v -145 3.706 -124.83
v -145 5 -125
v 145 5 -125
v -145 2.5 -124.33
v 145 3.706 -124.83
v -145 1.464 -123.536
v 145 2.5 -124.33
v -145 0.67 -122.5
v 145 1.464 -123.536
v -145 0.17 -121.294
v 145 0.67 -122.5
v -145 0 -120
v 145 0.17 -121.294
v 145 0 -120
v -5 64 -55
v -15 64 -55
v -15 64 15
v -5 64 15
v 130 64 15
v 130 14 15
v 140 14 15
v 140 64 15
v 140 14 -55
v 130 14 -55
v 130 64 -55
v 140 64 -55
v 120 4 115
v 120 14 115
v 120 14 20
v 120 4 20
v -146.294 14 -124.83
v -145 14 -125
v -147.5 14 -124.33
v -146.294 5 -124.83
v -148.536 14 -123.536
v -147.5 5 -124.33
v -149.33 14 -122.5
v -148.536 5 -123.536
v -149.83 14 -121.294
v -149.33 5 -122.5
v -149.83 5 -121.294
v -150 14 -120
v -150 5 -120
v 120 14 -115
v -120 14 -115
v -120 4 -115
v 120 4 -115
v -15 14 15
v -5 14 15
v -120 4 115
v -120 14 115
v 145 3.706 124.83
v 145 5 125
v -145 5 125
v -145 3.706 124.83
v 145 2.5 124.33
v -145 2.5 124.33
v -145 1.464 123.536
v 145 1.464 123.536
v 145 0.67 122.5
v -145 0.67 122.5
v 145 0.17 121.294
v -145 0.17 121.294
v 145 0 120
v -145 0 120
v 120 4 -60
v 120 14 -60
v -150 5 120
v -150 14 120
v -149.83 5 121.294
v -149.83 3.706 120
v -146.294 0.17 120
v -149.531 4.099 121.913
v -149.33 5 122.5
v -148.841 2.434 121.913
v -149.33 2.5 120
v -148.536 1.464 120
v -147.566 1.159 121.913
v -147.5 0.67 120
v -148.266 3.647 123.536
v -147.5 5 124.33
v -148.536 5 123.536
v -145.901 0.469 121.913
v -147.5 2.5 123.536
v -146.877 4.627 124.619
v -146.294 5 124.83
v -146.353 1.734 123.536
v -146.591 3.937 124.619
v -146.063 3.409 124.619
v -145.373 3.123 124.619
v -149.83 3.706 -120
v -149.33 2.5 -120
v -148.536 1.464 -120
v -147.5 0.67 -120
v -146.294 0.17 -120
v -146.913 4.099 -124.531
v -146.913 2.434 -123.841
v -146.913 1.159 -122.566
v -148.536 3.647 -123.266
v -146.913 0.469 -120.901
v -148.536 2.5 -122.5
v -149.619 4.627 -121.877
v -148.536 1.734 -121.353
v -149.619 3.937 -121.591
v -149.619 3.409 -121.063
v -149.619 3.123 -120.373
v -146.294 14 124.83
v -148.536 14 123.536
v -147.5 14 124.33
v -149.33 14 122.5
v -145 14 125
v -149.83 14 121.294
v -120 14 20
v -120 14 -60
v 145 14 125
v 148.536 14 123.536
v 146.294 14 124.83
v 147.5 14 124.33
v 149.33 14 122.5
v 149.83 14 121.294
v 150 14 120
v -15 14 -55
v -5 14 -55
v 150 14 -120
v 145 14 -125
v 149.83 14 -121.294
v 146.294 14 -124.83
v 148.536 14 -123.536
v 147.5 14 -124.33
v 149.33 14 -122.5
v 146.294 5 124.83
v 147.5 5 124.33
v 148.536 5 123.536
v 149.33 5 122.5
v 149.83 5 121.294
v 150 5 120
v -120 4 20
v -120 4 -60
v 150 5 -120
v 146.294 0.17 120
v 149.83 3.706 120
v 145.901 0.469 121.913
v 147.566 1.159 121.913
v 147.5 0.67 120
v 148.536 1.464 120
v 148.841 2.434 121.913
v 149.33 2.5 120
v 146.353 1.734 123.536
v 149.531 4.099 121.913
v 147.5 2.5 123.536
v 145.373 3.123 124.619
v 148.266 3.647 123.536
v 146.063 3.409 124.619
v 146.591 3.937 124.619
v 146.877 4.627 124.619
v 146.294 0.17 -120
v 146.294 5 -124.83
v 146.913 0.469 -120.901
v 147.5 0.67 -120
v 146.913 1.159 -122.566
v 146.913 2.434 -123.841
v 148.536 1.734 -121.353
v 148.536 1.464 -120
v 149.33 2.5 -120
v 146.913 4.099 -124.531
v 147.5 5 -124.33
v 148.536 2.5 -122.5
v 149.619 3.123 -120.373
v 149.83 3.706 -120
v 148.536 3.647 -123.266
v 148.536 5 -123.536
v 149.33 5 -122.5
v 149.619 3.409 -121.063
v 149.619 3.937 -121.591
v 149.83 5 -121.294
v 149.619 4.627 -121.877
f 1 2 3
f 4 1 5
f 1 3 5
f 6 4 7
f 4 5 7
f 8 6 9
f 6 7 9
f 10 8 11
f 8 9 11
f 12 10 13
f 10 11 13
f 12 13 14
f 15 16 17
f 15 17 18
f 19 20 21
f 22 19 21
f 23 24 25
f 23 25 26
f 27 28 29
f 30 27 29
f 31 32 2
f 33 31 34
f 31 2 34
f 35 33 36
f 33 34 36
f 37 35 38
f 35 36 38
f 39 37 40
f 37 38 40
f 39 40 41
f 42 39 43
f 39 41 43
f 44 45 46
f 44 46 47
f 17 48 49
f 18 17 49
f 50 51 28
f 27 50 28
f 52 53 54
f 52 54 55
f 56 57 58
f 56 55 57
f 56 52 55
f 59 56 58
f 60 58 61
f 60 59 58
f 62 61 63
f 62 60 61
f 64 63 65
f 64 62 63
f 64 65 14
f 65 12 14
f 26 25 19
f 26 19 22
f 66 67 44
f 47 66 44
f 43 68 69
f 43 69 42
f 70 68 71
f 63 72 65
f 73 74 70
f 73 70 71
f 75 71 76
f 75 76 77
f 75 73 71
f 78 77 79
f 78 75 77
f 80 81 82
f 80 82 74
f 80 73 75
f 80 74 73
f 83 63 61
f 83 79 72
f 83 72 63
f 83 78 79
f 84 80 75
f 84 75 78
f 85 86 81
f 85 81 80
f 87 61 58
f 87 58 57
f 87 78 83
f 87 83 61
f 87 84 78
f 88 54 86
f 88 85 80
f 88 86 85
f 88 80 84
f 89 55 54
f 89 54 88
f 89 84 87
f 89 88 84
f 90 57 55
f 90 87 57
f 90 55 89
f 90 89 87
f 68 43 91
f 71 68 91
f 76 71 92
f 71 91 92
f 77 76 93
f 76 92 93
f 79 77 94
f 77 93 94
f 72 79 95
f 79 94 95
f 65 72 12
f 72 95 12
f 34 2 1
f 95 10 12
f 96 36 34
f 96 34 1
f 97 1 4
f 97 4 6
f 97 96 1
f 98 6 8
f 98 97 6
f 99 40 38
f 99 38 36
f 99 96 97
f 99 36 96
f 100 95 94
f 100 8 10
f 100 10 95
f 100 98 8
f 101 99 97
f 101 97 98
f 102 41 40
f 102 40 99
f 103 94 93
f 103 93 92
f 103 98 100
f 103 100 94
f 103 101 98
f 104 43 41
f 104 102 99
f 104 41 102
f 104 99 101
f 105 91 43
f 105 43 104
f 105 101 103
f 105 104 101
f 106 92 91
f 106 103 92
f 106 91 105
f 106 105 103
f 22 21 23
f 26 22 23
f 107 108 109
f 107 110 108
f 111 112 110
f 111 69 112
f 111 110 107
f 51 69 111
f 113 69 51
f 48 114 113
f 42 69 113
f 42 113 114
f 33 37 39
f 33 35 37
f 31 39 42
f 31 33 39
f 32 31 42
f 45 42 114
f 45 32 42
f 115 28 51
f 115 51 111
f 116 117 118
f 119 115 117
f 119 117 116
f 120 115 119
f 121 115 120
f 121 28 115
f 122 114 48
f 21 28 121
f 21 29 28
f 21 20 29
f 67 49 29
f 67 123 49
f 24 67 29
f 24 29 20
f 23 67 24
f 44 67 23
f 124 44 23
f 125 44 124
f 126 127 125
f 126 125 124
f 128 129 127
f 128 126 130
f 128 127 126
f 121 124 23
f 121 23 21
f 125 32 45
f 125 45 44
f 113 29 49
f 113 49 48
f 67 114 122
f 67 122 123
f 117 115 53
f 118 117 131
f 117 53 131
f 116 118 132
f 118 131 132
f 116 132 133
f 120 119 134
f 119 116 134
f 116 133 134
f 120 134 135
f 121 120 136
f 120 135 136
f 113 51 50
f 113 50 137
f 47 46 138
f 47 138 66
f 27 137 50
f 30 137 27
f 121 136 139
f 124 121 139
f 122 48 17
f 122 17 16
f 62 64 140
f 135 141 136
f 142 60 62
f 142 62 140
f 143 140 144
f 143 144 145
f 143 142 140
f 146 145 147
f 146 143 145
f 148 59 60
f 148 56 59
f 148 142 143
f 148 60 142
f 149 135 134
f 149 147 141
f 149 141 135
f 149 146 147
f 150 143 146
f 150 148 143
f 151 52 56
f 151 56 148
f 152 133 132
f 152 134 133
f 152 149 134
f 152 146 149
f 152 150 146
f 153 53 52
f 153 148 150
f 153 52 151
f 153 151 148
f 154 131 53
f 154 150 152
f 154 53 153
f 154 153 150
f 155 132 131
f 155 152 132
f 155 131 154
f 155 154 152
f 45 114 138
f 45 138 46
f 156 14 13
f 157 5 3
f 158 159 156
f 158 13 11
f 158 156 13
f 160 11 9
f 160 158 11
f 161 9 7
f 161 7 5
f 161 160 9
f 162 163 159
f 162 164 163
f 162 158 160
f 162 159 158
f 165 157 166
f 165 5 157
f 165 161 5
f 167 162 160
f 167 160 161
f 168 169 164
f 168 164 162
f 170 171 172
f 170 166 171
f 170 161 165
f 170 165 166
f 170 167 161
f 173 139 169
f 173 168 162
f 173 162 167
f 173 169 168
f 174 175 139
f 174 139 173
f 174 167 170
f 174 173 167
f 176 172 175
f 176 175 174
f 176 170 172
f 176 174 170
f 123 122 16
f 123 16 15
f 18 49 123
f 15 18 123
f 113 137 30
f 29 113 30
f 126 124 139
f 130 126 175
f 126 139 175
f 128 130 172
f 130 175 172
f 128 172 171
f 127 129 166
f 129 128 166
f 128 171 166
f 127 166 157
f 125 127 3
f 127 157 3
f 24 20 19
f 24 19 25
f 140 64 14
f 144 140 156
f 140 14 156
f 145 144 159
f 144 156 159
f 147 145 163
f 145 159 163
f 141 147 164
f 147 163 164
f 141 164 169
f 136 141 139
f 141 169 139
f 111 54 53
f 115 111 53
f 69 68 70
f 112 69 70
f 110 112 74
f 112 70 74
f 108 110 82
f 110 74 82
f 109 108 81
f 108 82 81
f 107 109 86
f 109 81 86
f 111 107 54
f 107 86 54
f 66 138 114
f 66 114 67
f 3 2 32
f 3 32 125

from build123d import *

# Parameters (mm, degrees)
SKETCH1_W          = 300
SKETCH1_H          = 250
BASE_DEPTH         = 14
SKETCH3_W          = 240
SKETCH3_H          = 230
CUT_EXTRUDE1_DEPTH = 10
FILLET1_R          = 5
FILLET2_R          = 5
SKETCH4_W          = 240
SKETCH4_H          = 80
DIN_BASE_DEPTH     = 10
SKETCH5_W          = 10
SKETCH5_H          = 70
DIN_STAND_DEPTH    = 50


with BuildPart() as part:
    # Sketch1 → Base (new body)
    with BuildSketch(Plane(origin=(0, 0, 0), x_dir=(1, 0, 0), z_dir=(0, 1, 0))):
        Rectangle(SKETCH1_W, SKETCH1_H)
    extrude(amount=BASE_DEPTH)

    # Sketch3 → Cut-Extrude1 (cut)
    with BuildSketch(Plane(origin=(0, 14, 0), x_dir=(1, 0, 0), z_dir=(0, 1, 0))):
        Rectangle(SKETCH3_W, SKETCH3_H)
    extrude(amount=-CUT_EXTRUDE1_DEPTH, mode=Mode.SUBTRACT)

    # Fillet1
    fillet1_edges = [part.edges().sort_by_distance(p)[0] for p in [
        (0, 0, 125),
        (-150, 0, 0),
        (0, 0, -125),
        (150, 0, 0),
    ]]
    fillet(fillet1_edges, radius=FILLET1_R)

    # Fillet2
    # the kernel refuses this fillet: 5 mm, written as the material it takes off along each edge
    with BuildSketch(Plane(origin=(145, 5, 120), x_dir=(1, 0, 0), z_dir=(0, 0, 1))) as fillet2_piece_1_section:
        Polygon((0, 0), (FILLET2_R, 0), (FILLET2_R, -FILLET2_R), (0, -FILLET2_R), align=None)
    fillet2_piece_1 = extrude(amount=FILLET2_R, mode=Mode.PRIVATE)
    fillet2_piece_1 = fillet2_piece_1 - Plane(origin=(145, 5, 120), x_dir=(-0.7071067811865475, 0.7071067811865475, 0), z_dir=(0, 0, 1)) * Sphere(FILLET2_R, mode=Mode.PRIVATE)
    add(fillet2_piece_1, mode=Mode.SUBTRACT)
    with BuildSketch(Plane(origin=(-145, 5, 120), x_dir=(-1, 0, 0), z_dir=(0, 0, 1))) as fillet2_piece_2_section:
        Polygon((0, 0), (FILLET2_R, 0), (FILLET2_R, FILLET2_R), (0, FILLET2_R), align=None)
    fillet2_piece_2 = extrude(amount=FILLET2_R, mode=Mode.PRIVATE)
    fillet2_piece_2 = fillet2_piece_2 - Plane(origin=(-145, 5, 120), x_dir=(0.7071067811865475, 0.7071067811865475, 0), z_dir=(0, 0, 1)) * Sphere(FILLET2_R, mode=Mode.PRIVATE)
    add(fillet2_piece_2, mode=Mode.SUBTRACT)
    with BuildSketch(Plane(origin=(145, 5, -120), x_dir=(0, 0, -1), z_dir=(1, 0, 0))) as fillet2_piece_3_section:
        Polygon((0, 0), (FILLET2_R, 0), (FILLET2_R, -FILLET2_R), (0, -FILLET2_R), align=None)
    fillet2_piece_3 = extrude(amount=FILLET2_R, mode=Mode.PRIVATE)
    fillet2_piece_3 = fillet2_piece_3 - Plane(origin=(145, 5, -120), x_dir=(0, 0.7071067811865475, 0.7071067811865475), z_dir=(1, 0, 0)) * Sphere(FILLET2_R, mode=Mode.PRIVATE)
    add(fillet2_piece_3, mode=Mode.SUBTRACT)
    with BuildSketch(Plane(origin=(-145, 5, -120), x_dir=(0, 0, -1), z_dir=(-1, 0, 0))) as fillet2_piece_4_section:
        Polygon((0, 0), (FILLET2_R, 0), (FILLET2_R, FILLET2_R), (0, FILLET2_R), align=None)
    fillet2_piece_4 = extrude(amount=FILLET2_R, mode=Mode.PRIVATE)
    fillet2_piece_4 = fillet2_piece_4 - Plane(origin=(-145, 5, -120), x_dir=(0, 0.7071067811865475, 0.7071067811865475), z_dir=(-1, 0, 0)) * Sphere(FILLET2_R, mode=Mode.PRIVATE)
    add(fillet2_piece_4, mode=Mode.SUBTRACT)
    with BuildSketch(Plane(origin=(150, 5, 125), x_dir=(-1, 0, 0), z_dir=(0, 1, 0)), Plane(origin=(150, 5, -125), x_dir=(0, 0, 1), z_dir=(0, 1, 0))) as fillet2_piece_5:
        with BuildLine():
            CenterArc((FILLET2_R, -FILLET2_R), FILLET2_R, 90, 90)
            Line((0, -FILLET2_R), (0, 0))
            Line((0, 0), (FILLET2_R, 0))
        make_face()
    extrude(amount=21.5, mode=Mode.SUBTRACT)
    with BuildSketch(Plane(origin=(-150, 5, 125), x_dir=(1, 0, 0), z_dir=(0, 1, 0)), Plane(origin=(-150, 5, -125), x_dir=(0, 0, 1), z_dir=(0, 1, 0))) as fillet2_piece_6:
        with BuildLine():
            CenterArc((FILLET2_R, FILLET2_R), FILLET2_R, 180, 90)
            Line((0, FILLET2_R), (0, 0))
            Line((0, 0), (FILLET2_R, 0))
        make_face()
    extrude(amount=21.5, mode=Mode.SUBTRACT)

    # Sketch4 → DIN Base (add)
    with BuildSketch(Plane(origin=(0, 4, 0), x_dir=(1, 0, 0), z_dir=(0, 1, 0))):
        with Locations((0, 20)):
            Rectangle(SKETCH4_W, SKETCH4_H)
    extrude(amount=DIN_BASE_DEPTH)

    # Sketch5 → DIN Stand (add)
    with BuildSketch(Plane(origin=(0, 14, 0), x_dir=(1, 0, 0), z_dir=(0, 1, 0))):
        with Locations((135, 20)):
            Rectangle(SKETCH5_W, SKETCH5_H)
        with Locations((-10, 20)):
            Rectangle(SKETCH5_W, SKETCH5_H)
    extrude(amount=DIN_STAND_DEPTH)


solid = part.part
